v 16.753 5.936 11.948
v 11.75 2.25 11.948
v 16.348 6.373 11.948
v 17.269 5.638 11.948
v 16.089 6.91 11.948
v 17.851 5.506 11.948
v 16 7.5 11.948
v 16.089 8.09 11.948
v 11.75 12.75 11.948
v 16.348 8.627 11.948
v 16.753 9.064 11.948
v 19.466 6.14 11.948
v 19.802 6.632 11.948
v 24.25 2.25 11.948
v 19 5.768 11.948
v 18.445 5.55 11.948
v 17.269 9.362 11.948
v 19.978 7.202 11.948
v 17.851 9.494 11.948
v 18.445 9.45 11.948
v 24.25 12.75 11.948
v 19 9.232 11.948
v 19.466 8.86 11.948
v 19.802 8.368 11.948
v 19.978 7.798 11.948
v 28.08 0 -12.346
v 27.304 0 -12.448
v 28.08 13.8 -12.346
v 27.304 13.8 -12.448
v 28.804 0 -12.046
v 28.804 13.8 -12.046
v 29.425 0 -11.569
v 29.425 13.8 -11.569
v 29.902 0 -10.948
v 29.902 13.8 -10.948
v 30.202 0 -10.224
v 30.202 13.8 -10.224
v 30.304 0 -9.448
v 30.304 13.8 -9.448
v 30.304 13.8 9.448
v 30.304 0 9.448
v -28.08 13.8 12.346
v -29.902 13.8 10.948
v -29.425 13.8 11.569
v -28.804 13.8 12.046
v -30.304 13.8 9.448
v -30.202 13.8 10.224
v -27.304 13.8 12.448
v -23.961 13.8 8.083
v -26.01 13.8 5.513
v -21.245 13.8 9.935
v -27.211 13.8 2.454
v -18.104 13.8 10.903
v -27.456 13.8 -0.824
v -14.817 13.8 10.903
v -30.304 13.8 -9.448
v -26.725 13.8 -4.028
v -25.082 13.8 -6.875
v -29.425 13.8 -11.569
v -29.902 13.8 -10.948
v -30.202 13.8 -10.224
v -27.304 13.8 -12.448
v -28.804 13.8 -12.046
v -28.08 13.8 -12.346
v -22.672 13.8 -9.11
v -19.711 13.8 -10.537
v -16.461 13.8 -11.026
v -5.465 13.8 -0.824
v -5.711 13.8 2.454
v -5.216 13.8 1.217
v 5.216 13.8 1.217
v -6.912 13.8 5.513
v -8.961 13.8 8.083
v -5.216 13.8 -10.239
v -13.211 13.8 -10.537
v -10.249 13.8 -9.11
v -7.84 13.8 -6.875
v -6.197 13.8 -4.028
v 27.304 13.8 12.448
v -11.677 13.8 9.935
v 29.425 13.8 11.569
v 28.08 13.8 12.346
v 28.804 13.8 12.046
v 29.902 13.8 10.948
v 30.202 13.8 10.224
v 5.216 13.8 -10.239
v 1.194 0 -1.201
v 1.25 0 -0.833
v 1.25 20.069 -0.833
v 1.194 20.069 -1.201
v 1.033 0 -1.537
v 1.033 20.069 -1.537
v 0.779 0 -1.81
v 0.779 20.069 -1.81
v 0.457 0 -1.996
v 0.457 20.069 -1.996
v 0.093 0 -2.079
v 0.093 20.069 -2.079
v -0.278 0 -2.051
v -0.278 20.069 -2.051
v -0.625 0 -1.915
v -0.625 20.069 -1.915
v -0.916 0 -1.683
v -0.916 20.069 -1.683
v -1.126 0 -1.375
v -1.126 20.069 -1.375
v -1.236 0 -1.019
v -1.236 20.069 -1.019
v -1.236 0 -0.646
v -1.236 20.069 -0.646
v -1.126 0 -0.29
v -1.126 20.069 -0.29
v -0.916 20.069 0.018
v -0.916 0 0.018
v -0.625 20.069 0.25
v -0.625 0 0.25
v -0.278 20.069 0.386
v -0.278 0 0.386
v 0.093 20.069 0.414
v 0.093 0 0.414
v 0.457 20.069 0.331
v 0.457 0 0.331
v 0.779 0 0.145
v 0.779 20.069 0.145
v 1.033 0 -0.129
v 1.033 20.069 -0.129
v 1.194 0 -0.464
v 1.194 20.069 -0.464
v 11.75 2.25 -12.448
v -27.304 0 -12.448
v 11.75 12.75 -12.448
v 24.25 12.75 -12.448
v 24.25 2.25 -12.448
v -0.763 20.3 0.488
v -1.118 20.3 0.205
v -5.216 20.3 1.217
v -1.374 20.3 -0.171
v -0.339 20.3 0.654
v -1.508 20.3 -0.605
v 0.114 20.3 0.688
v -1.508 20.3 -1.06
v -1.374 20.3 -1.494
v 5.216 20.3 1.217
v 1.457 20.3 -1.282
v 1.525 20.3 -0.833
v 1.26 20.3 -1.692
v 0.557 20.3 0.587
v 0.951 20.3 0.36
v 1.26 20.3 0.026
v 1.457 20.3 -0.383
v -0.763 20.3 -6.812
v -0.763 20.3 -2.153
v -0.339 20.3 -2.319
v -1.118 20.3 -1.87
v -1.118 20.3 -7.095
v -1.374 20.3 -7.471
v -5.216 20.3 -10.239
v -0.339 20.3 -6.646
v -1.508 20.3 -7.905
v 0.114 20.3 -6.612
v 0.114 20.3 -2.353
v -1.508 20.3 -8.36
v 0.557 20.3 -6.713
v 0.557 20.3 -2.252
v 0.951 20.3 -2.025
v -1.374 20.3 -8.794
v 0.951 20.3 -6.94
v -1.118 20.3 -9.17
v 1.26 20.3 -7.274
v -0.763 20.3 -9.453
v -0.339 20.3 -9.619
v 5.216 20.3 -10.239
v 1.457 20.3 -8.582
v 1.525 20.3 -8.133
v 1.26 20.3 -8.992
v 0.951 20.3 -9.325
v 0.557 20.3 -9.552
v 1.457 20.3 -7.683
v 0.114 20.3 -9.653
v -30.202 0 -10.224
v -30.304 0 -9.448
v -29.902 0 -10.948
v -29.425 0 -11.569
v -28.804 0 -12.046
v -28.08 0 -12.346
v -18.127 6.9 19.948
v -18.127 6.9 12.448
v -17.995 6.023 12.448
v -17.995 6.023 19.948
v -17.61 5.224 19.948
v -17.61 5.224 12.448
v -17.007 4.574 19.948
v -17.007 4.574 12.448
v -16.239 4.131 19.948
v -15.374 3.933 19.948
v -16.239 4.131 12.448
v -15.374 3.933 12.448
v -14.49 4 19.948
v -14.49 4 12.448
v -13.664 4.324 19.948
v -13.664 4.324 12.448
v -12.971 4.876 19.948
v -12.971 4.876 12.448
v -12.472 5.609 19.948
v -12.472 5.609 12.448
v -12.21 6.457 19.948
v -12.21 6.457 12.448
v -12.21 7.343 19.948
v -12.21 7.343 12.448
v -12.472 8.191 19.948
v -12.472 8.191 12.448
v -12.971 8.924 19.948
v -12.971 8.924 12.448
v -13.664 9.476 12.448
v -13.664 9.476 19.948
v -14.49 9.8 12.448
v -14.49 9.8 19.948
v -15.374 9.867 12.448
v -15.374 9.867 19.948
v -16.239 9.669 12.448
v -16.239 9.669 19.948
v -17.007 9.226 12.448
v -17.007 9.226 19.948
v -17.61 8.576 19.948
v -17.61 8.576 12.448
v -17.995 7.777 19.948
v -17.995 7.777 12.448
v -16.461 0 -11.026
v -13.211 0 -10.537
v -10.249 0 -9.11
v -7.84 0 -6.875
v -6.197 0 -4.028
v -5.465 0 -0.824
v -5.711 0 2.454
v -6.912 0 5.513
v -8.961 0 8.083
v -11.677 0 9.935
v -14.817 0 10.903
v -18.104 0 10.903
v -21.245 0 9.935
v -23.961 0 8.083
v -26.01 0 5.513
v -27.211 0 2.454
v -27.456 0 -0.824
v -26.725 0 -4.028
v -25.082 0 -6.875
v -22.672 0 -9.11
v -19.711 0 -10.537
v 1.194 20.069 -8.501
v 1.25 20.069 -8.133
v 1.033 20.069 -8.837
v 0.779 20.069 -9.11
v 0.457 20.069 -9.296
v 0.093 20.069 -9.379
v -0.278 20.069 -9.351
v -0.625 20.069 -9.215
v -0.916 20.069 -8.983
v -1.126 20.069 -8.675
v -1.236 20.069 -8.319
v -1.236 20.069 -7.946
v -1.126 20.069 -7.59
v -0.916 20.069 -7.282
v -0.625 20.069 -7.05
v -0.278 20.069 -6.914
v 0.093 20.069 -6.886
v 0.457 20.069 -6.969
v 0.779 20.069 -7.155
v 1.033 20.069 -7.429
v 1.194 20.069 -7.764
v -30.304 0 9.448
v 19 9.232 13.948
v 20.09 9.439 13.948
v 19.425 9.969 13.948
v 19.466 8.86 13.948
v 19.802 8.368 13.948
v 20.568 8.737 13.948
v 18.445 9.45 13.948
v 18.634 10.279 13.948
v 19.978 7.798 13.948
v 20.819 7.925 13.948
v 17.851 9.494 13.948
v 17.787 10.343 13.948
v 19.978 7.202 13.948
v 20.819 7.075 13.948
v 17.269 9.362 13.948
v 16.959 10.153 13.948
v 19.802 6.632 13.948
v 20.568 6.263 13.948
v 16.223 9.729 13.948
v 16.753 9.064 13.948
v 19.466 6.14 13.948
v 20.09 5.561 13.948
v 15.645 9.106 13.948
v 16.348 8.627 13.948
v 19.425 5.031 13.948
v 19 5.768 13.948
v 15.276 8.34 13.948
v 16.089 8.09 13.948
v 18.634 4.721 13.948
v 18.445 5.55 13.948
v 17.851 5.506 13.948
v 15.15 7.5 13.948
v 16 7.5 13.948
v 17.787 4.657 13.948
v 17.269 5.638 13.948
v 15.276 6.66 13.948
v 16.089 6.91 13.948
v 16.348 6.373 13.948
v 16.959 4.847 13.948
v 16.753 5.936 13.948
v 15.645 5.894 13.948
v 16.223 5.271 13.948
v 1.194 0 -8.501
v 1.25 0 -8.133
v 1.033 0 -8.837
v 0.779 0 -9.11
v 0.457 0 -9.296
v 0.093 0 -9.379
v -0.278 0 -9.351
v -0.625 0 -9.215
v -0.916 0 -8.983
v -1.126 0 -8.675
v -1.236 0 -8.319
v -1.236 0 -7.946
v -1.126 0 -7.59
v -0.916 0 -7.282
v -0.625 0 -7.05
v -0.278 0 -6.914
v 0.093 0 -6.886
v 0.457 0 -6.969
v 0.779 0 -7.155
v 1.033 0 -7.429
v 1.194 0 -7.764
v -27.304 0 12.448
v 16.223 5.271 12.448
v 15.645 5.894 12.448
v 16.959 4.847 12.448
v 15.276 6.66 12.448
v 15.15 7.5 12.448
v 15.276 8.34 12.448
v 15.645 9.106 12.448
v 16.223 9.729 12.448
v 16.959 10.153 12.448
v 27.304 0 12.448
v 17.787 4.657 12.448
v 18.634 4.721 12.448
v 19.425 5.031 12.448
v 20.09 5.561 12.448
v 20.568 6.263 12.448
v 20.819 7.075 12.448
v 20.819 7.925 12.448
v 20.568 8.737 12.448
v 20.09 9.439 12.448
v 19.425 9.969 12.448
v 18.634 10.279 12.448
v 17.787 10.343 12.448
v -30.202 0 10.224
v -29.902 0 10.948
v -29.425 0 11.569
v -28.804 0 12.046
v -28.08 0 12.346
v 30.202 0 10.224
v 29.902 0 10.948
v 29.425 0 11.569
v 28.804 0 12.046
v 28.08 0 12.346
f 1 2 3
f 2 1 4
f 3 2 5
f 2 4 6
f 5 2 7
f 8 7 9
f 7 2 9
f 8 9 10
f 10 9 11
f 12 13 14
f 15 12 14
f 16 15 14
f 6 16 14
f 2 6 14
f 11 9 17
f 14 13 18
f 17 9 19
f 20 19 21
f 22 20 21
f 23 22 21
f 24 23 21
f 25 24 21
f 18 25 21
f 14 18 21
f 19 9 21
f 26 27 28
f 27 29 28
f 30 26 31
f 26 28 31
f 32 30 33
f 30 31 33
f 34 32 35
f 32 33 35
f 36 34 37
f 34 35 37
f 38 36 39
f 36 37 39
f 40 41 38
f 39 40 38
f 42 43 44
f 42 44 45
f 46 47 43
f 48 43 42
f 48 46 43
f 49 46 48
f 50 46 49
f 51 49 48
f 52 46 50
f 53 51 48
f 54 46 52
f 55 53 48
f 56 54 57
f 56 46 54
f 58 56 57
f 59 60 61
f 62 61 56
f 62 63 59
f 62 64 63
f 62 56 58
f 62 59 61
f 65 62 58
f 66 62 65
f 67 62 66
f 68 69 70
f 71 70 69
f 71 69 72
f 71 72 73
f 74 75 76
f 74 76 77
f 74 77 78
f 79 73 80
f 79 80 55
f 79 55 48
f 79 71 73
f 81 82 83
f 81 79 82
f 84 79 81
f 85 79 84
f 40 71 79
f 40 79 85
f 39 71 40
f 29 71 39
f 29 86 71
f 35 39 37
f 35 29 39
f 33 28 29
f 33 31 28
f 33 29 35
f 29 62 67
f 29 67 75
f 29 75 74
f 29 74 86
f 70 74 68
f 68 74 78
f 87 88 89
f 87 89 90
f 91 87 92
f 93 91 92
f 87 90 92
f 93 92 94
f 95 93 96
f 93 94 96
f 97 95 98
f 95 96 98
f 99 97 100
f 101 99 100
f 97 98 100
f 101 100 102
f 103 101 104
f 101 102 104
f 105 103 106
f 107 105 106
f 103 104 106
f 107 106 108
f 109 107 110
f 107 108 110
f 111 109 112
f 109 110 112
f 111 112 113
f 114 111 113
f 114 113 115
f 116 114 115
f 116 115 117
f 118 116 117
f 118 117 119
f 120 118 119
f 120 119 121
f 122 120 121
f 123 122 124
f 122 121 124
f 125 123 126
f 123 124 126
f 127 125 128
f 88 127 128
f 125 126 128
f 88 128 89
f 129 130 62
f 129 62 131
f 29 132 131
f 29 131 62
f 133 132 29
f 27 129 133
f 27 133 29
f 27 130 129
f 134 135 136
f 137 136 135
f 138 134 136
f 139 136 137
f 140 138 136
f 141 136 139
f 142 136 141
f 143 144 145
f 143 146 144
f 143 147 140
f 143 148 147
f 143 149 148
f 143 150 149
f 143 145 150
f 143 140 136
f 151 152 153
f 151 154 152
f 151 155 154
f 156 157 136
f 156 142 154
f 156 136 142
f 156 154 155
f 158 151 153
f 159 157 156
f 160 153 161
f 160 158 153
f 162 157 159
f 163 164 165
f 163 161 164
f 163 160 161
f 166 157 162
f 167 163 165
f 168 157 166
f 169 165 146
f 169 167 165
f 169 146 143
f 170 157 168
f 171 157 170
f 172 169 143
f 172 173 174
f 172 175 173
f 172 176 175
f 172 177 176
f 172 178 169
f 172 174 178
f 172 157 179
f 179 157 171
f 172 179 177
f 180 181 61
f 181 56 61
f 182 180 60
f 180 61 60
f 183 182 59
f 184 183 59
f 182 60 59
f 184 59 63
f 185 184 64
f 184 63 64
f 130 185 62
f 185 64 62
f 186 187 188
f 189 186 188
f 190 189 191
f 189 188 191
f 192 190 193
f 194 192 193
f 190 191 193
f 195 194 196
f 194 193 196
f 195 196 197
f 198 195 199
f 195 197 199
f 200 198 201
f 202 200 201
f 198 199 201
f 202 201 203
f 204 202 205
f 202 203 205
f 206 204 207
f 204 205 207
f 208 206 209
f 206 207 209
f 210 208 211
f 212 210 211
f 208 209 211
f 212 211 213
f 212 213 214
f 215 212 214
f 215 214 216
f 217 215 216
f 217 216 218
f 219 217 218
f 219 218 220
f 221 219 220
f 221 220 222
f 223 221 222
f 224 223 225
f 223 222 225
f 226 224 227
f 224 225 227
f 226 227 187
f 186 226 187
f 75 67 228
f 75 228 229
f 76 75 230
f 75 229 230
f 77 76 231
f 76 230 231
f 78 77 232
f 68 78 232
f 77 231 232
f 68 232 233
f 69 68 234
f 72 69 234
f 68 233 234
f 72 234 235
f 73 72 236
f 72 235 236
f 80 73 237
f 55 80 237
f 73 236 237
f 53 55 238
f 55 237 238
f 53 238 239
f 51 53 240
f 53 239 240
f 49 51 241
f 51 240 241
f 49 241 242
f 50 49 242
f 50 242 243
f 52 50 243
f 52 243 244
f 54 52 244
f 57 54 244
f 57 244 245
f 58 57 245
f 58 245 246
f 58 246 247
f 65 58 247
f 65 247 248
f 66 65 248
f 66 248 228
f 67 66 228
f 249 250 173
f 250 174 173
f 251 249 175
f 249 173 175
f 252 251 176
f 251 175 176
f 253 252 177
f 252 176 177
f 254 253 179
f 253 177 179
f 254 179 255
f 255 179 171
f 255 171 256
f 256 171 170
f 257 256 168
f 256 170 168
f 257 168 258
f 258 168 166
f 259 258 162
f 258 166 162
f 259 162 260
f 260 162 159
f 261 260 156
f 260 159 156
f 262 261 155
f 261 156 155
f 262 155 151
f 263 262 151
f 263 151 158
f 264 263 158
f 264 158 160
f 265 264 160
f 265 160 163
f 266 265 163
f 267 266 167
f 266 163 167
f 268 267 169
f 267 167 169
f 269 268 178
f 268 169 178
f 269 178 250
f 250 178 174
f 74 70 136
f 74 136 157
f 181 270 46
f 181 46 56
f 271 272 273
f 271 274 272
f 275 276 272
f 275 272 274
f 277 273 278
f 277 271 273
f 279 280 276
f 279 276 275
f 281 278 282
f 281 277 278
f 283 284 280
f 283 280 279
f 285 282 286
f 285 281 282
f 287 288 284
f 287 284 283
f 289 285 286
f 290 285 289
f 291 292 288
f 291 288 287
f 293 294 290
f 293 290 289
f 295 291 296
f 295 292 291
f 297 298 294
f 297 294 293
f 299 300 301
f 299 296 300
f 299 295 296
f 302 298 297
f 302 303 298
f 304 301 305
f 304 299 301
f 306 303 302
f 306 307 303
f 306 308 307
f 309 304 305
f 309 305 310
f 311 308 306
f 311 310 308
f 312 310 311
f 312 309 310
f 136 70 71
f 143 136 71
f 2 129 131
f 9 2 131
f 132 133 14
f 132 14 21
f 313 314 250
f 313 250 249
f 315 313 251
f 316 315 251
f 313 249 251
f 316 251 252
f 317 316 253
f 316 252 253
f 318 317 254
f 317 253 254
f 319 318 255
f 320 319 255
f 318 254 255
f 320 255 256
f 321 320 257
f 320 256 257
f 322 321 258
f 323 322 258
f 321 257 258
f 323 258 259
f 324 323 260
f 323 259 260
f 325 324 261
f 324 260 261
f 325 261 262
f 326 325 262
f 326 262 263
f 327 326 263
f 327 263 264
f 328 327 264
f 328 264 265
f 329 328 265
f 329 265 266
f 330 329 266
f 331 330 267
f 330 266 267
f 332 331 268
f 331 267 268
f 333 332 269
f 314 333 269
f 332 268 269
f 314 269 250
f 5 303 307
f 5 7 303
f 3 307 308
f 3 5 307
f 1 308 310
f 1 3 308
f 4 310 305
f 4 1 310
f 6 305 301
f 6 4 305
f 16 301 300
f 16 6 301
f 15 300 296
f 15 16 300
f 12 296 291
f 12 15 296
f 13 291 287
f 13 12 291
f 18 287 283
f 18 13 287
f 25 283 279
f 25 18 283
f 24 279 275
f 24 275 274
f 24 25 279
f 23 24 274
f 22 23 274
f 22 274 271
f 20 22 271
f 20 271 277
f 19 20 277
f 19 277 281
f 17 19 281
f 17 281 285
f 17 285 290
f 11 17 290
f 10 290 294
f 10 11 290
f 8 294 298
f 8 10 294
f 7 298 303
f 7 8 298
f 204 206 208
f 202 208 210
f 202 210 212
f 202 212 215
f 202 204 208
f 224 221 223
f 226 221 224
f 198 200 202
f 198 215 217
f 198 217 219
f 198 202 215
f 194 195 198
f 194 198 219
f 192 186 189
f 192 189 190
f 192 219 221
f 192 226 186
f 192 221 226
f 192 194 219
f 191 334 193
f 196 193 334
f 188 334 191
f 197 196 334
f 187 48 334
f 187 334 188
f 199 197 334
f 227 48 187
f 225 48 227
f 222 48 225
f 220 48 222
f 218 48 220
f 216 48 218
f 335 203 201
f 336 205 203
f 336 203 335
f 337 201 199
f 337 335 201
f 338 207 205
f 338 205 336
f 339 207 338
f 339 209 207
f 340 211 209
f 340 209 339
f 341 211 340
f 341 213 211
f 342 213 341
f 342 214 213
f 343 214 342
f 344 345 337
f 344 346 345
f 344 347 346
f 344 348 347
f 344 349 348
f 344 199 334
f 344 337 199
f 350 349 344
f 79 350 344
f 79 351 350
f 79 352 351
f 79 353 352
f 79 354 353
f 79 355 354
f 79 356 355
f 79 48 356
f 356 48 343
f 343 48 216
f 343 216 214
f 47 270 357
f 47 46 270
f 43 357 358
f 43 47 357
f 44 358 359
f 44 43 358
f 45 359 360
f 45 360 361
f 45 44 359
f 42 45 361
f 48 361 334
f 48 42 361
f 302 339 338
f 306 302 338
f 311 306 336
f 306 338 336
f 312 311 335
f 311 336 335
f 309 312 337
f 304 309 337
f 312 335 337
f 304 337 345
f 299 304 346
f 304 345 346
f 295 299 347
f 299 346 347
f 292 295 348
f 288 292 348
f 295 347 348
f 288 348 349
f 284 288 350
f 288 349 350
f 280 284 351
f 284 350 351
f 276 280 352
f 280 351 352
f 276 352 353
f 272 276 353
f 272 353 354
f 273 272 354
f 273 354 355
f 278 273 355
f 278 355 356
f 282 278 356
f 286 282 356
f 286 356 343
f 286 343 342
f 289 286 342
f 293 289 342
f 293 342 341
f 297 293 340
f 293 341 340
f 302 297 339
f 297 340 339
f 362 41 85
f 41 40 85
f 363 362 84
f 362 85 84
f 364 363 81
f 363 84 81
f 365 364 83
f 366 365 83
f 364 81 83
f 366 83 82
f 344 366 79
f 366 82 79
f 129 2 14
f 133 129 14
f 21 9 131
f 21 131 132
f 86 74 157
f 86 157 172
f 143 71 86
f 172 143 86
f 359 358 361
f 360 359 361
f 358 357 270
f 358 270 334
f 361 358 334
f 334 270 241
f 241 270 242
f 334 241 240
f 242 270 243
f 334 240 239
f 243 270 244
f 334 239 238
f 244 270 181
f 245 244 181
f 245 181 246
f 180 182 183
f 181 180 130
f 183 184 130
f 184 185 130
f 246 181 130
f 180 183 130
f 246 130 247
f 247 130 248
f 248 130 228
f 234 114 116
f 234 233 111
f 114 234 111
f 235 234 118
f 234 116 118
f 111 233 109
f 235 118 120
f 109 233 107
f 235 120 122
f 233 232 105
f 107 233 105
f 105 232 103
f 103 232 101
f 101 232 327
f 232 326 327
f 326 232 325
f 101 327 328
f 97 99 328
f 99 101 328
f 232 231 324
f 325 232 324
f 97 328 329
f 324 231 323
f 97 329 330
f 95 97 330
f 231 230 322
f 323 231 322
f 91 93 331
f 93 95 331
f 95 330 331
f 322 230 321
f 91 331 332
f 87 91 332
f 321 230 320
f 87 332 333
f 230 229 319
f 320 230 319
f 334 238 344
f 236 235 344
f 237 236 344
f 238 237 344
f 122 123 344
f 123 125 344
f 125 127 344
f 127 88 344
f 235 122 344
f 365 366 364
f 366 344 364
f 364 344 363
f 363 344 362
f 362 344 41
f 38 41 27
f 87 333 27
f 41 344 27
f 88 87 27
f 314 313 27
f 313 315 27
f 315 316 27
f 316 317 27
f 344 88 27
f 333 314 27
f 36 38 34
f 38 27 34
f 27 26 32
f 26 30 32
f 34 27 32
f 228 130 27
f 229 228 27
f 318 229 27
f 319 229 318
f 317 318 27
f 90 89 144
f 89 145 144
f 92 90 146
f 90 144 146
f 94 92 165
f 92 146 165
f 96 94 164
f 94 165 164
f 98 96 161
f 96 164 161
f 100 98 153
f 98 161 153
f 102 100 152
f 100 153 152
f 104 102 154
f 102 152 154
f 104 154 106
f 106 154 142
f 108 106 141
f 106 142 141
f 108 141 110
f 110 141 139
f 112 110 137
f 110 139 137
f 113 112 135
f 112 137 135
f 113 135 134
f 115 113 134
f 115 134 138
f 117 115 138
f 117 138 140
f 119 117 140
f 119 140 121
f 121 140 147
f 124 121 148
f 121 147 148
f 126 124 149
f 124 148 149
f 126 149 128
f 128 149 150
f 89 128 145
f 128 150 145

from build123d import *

# Parameters (mm, degrees)
SKETCH_1_W          = 60.60764715
SKETCH_1_H          = 24.895940982
EXTRUDE_1_DEPTH     = 13.8
SKETCH_2_W          = 12.5
SKETCH_2_H          = 10.5
CUT_EXTRUDE_1_DEPTH = 42.576070048
SKETCH_3_W          = 12.5
SKETCH_3_H          = 10.5
EXTRUDE_2_DEPTH     = 0.5
SKETCH_4_R          = 2
CUT_EXTRUDE_2_DEPTH = 42.278610196
SKETCH_5_R          = 2.975
EXTRUDE_3_DEPTH     = 7.5
SKETCH_10_W         = 10.431635196
SKETCH_10_H         = 11.456709174
EXTRUDE_4_DEPTH     = 6.5
SKETCH_14_R         = 2.850486714
SKETCH_14_R_2       = 2
EXTRUDE_5_DEPTH     = 1.5
SKETCH_22_R         = 11.026465904
CUT_EXTRUDE_5_DEPTH = 42.573227563
FILLET_1_R          = 3
FILLET_2_R          = 3
FILLET_3_R          = 3
FILLET_4_R          = 3


# Read off the part's stored shape, not the designer's step: M3 螺紋孔3
with BuildPart() as part:
    # 草圖1 → 填料-伸長1 (new body)
    with BuildSketch(Plane(origin=(0, 0, 0), x_dir=(1, 0, 0), z_dir=(0, 1, 0))):
        Rectangle(SKETCH_1_W, SKETCH_1_H)
    extrude(amount=EXTRUDE_1_DEPTH)

    # 草圖2 → 除料-伸長1 (cut, through all)
    with BuildSketch(Plane.XY.offset(12.447970491)):
        with Locations((18, 7.5)):
            Rectangle(SKETCH_2_W, SKETCH_2_H)
    extrude(amount=-CUT_EXTRUDE_1_DEPTH, mode=Mode.SUBTRACT)

    # 草圖3 → 填料-伸長2 (add)
    with BuildSketch(Plane.XY.offset(12.447970491)):
        with Locations((18, 7.5)):
            Rectangle(SKETCH_3_W, SKETCH_3_H)
    extrude(amount=-EXTRUDE_2_DEPTH)

    # 草圖4 → 除料-伸長2 (cut, through all)
    with BuildSketch(Plane(origin=(0, 0, 11.947970491), x_dir=(-1, 0, 0), z_dir=(0, 0, -1))):
        with Locations((-18, 7.5)):
            Circle(SKETCH_4_R)
    extrude(amount=-CUT_EXTRUDE_2_DEPTH, mode=Mode.SUBTRACT)

    # 草圖5 → 填料-伸長3 (add)
    with BuildSketch(Plane.XY.offset(12.447970491)):
        with Locations(Location((-15.151911787, 6.9, 0), (0, 0, 180))):
            Circle(SKETCH_5_R)
    extrude(amount=EXTRUDE_3_DEPTH)

    # 草圖10 → 填料-伸長4 (add)
    with BuildSketch(Plane(origin=(0, 13.8, 0), x_dir=(1, 0, 0), z_dir=(0, 1, 0))):
        with Locations((0, 4.510890299)):
            Rectangle(SKETCH_10_W, SKETCH_10_H)
    extrude(amount=EXTRUDE_4_DEPTH)

    # M3 螺紋孔3 outline → M3 螺紋孔3 (revolve, cut)
    with BuildSketch(Plane.XY.offset(-8.13268367)):
        Polygon((0, 0), (1.25, 0), (1.25, 20.069247601), (1.525, 20.3), (0, 20.3), align=None)
    revolve(axis=Axis((0, 0, -8.13268367), (0, 1, 0)), mode=Mode.SUBTRACT)

    # Hole Wizard M3 _3 2 outline → Hole Wizard M3 _3 2 (revolve, cut)
    with BuildSketch(Plane.XY.offset(-0.83268367)):
        Polygon((0, 0), (1.25, 0), (1.25, 20.069247601), (1.525, 20.3), (0, 20.3), align=None)
    revolve(axis=Axis((0, 0, -0.83268367), (0, 1, 0)), mode=Mode.SUBTRACT)

    # 草圖14 → 填料-伸長5 (add)
    with BuildSketch(Plane.XY.offset(12.447970491)):
        with Locations(Location((18, 7.5, 0), (0, 0, 180))):
            Circle(SKETCH_14_R)
        with Locations(Location((18, 7.5, 0), (0, 0, 180))):
            Circle(SKETCH_14_R_2, mode=Mode.SUBTRACT)
    extrude(amount=EXTRUDE_5_DEPTH)

    # 草圖22 → 除料-伸長5 (cut, through all)
    with BuildSketch(Plane.XZ):
        with Locations(Location((-16.460754219, 0, 0), (0, 0, 270))):
            Circle(SKETCH_22_R)
    extrude(amount=-CUT_EXTRUDE_5_DEPTH, mode=Mode.SUBTRACT)

    # 圓角1
    fillet_1_edges = [part.edges().sort_by_distance(p)[0] for p in [
        (-30.303823575, 6.9, -12.447970491),
    ]]
    fillet(fillet_1_edges, radius=FILLET_1_R)

    # 圓角2
    fillet_2_edges = [part.edges().sort_by_distance(p)[0] for p in [
        (-30.303823575, 6.9, 12.447970491),
    ]]
    fillet(fillet_2_edges, radius=FILLET_2_R)

    # 圓角3
    fillet_3_edges = [part.edges().sort_by_distance(p)[0] for p in [
        (30.303823575, 6.9, -12.447970491),
    ]]
    fillet(fillet_3_edges, radius=FILLET_3_R)

    # 圓角4
    fillet_4_edges = [part.edges().sort_by_distance(p)[0] for p in [
        (30.303823575, 6.9, 12.447970491),
    ]]
    fillet(fillet_4_edges, radius=FILLET_4_R)


solid = part.part
